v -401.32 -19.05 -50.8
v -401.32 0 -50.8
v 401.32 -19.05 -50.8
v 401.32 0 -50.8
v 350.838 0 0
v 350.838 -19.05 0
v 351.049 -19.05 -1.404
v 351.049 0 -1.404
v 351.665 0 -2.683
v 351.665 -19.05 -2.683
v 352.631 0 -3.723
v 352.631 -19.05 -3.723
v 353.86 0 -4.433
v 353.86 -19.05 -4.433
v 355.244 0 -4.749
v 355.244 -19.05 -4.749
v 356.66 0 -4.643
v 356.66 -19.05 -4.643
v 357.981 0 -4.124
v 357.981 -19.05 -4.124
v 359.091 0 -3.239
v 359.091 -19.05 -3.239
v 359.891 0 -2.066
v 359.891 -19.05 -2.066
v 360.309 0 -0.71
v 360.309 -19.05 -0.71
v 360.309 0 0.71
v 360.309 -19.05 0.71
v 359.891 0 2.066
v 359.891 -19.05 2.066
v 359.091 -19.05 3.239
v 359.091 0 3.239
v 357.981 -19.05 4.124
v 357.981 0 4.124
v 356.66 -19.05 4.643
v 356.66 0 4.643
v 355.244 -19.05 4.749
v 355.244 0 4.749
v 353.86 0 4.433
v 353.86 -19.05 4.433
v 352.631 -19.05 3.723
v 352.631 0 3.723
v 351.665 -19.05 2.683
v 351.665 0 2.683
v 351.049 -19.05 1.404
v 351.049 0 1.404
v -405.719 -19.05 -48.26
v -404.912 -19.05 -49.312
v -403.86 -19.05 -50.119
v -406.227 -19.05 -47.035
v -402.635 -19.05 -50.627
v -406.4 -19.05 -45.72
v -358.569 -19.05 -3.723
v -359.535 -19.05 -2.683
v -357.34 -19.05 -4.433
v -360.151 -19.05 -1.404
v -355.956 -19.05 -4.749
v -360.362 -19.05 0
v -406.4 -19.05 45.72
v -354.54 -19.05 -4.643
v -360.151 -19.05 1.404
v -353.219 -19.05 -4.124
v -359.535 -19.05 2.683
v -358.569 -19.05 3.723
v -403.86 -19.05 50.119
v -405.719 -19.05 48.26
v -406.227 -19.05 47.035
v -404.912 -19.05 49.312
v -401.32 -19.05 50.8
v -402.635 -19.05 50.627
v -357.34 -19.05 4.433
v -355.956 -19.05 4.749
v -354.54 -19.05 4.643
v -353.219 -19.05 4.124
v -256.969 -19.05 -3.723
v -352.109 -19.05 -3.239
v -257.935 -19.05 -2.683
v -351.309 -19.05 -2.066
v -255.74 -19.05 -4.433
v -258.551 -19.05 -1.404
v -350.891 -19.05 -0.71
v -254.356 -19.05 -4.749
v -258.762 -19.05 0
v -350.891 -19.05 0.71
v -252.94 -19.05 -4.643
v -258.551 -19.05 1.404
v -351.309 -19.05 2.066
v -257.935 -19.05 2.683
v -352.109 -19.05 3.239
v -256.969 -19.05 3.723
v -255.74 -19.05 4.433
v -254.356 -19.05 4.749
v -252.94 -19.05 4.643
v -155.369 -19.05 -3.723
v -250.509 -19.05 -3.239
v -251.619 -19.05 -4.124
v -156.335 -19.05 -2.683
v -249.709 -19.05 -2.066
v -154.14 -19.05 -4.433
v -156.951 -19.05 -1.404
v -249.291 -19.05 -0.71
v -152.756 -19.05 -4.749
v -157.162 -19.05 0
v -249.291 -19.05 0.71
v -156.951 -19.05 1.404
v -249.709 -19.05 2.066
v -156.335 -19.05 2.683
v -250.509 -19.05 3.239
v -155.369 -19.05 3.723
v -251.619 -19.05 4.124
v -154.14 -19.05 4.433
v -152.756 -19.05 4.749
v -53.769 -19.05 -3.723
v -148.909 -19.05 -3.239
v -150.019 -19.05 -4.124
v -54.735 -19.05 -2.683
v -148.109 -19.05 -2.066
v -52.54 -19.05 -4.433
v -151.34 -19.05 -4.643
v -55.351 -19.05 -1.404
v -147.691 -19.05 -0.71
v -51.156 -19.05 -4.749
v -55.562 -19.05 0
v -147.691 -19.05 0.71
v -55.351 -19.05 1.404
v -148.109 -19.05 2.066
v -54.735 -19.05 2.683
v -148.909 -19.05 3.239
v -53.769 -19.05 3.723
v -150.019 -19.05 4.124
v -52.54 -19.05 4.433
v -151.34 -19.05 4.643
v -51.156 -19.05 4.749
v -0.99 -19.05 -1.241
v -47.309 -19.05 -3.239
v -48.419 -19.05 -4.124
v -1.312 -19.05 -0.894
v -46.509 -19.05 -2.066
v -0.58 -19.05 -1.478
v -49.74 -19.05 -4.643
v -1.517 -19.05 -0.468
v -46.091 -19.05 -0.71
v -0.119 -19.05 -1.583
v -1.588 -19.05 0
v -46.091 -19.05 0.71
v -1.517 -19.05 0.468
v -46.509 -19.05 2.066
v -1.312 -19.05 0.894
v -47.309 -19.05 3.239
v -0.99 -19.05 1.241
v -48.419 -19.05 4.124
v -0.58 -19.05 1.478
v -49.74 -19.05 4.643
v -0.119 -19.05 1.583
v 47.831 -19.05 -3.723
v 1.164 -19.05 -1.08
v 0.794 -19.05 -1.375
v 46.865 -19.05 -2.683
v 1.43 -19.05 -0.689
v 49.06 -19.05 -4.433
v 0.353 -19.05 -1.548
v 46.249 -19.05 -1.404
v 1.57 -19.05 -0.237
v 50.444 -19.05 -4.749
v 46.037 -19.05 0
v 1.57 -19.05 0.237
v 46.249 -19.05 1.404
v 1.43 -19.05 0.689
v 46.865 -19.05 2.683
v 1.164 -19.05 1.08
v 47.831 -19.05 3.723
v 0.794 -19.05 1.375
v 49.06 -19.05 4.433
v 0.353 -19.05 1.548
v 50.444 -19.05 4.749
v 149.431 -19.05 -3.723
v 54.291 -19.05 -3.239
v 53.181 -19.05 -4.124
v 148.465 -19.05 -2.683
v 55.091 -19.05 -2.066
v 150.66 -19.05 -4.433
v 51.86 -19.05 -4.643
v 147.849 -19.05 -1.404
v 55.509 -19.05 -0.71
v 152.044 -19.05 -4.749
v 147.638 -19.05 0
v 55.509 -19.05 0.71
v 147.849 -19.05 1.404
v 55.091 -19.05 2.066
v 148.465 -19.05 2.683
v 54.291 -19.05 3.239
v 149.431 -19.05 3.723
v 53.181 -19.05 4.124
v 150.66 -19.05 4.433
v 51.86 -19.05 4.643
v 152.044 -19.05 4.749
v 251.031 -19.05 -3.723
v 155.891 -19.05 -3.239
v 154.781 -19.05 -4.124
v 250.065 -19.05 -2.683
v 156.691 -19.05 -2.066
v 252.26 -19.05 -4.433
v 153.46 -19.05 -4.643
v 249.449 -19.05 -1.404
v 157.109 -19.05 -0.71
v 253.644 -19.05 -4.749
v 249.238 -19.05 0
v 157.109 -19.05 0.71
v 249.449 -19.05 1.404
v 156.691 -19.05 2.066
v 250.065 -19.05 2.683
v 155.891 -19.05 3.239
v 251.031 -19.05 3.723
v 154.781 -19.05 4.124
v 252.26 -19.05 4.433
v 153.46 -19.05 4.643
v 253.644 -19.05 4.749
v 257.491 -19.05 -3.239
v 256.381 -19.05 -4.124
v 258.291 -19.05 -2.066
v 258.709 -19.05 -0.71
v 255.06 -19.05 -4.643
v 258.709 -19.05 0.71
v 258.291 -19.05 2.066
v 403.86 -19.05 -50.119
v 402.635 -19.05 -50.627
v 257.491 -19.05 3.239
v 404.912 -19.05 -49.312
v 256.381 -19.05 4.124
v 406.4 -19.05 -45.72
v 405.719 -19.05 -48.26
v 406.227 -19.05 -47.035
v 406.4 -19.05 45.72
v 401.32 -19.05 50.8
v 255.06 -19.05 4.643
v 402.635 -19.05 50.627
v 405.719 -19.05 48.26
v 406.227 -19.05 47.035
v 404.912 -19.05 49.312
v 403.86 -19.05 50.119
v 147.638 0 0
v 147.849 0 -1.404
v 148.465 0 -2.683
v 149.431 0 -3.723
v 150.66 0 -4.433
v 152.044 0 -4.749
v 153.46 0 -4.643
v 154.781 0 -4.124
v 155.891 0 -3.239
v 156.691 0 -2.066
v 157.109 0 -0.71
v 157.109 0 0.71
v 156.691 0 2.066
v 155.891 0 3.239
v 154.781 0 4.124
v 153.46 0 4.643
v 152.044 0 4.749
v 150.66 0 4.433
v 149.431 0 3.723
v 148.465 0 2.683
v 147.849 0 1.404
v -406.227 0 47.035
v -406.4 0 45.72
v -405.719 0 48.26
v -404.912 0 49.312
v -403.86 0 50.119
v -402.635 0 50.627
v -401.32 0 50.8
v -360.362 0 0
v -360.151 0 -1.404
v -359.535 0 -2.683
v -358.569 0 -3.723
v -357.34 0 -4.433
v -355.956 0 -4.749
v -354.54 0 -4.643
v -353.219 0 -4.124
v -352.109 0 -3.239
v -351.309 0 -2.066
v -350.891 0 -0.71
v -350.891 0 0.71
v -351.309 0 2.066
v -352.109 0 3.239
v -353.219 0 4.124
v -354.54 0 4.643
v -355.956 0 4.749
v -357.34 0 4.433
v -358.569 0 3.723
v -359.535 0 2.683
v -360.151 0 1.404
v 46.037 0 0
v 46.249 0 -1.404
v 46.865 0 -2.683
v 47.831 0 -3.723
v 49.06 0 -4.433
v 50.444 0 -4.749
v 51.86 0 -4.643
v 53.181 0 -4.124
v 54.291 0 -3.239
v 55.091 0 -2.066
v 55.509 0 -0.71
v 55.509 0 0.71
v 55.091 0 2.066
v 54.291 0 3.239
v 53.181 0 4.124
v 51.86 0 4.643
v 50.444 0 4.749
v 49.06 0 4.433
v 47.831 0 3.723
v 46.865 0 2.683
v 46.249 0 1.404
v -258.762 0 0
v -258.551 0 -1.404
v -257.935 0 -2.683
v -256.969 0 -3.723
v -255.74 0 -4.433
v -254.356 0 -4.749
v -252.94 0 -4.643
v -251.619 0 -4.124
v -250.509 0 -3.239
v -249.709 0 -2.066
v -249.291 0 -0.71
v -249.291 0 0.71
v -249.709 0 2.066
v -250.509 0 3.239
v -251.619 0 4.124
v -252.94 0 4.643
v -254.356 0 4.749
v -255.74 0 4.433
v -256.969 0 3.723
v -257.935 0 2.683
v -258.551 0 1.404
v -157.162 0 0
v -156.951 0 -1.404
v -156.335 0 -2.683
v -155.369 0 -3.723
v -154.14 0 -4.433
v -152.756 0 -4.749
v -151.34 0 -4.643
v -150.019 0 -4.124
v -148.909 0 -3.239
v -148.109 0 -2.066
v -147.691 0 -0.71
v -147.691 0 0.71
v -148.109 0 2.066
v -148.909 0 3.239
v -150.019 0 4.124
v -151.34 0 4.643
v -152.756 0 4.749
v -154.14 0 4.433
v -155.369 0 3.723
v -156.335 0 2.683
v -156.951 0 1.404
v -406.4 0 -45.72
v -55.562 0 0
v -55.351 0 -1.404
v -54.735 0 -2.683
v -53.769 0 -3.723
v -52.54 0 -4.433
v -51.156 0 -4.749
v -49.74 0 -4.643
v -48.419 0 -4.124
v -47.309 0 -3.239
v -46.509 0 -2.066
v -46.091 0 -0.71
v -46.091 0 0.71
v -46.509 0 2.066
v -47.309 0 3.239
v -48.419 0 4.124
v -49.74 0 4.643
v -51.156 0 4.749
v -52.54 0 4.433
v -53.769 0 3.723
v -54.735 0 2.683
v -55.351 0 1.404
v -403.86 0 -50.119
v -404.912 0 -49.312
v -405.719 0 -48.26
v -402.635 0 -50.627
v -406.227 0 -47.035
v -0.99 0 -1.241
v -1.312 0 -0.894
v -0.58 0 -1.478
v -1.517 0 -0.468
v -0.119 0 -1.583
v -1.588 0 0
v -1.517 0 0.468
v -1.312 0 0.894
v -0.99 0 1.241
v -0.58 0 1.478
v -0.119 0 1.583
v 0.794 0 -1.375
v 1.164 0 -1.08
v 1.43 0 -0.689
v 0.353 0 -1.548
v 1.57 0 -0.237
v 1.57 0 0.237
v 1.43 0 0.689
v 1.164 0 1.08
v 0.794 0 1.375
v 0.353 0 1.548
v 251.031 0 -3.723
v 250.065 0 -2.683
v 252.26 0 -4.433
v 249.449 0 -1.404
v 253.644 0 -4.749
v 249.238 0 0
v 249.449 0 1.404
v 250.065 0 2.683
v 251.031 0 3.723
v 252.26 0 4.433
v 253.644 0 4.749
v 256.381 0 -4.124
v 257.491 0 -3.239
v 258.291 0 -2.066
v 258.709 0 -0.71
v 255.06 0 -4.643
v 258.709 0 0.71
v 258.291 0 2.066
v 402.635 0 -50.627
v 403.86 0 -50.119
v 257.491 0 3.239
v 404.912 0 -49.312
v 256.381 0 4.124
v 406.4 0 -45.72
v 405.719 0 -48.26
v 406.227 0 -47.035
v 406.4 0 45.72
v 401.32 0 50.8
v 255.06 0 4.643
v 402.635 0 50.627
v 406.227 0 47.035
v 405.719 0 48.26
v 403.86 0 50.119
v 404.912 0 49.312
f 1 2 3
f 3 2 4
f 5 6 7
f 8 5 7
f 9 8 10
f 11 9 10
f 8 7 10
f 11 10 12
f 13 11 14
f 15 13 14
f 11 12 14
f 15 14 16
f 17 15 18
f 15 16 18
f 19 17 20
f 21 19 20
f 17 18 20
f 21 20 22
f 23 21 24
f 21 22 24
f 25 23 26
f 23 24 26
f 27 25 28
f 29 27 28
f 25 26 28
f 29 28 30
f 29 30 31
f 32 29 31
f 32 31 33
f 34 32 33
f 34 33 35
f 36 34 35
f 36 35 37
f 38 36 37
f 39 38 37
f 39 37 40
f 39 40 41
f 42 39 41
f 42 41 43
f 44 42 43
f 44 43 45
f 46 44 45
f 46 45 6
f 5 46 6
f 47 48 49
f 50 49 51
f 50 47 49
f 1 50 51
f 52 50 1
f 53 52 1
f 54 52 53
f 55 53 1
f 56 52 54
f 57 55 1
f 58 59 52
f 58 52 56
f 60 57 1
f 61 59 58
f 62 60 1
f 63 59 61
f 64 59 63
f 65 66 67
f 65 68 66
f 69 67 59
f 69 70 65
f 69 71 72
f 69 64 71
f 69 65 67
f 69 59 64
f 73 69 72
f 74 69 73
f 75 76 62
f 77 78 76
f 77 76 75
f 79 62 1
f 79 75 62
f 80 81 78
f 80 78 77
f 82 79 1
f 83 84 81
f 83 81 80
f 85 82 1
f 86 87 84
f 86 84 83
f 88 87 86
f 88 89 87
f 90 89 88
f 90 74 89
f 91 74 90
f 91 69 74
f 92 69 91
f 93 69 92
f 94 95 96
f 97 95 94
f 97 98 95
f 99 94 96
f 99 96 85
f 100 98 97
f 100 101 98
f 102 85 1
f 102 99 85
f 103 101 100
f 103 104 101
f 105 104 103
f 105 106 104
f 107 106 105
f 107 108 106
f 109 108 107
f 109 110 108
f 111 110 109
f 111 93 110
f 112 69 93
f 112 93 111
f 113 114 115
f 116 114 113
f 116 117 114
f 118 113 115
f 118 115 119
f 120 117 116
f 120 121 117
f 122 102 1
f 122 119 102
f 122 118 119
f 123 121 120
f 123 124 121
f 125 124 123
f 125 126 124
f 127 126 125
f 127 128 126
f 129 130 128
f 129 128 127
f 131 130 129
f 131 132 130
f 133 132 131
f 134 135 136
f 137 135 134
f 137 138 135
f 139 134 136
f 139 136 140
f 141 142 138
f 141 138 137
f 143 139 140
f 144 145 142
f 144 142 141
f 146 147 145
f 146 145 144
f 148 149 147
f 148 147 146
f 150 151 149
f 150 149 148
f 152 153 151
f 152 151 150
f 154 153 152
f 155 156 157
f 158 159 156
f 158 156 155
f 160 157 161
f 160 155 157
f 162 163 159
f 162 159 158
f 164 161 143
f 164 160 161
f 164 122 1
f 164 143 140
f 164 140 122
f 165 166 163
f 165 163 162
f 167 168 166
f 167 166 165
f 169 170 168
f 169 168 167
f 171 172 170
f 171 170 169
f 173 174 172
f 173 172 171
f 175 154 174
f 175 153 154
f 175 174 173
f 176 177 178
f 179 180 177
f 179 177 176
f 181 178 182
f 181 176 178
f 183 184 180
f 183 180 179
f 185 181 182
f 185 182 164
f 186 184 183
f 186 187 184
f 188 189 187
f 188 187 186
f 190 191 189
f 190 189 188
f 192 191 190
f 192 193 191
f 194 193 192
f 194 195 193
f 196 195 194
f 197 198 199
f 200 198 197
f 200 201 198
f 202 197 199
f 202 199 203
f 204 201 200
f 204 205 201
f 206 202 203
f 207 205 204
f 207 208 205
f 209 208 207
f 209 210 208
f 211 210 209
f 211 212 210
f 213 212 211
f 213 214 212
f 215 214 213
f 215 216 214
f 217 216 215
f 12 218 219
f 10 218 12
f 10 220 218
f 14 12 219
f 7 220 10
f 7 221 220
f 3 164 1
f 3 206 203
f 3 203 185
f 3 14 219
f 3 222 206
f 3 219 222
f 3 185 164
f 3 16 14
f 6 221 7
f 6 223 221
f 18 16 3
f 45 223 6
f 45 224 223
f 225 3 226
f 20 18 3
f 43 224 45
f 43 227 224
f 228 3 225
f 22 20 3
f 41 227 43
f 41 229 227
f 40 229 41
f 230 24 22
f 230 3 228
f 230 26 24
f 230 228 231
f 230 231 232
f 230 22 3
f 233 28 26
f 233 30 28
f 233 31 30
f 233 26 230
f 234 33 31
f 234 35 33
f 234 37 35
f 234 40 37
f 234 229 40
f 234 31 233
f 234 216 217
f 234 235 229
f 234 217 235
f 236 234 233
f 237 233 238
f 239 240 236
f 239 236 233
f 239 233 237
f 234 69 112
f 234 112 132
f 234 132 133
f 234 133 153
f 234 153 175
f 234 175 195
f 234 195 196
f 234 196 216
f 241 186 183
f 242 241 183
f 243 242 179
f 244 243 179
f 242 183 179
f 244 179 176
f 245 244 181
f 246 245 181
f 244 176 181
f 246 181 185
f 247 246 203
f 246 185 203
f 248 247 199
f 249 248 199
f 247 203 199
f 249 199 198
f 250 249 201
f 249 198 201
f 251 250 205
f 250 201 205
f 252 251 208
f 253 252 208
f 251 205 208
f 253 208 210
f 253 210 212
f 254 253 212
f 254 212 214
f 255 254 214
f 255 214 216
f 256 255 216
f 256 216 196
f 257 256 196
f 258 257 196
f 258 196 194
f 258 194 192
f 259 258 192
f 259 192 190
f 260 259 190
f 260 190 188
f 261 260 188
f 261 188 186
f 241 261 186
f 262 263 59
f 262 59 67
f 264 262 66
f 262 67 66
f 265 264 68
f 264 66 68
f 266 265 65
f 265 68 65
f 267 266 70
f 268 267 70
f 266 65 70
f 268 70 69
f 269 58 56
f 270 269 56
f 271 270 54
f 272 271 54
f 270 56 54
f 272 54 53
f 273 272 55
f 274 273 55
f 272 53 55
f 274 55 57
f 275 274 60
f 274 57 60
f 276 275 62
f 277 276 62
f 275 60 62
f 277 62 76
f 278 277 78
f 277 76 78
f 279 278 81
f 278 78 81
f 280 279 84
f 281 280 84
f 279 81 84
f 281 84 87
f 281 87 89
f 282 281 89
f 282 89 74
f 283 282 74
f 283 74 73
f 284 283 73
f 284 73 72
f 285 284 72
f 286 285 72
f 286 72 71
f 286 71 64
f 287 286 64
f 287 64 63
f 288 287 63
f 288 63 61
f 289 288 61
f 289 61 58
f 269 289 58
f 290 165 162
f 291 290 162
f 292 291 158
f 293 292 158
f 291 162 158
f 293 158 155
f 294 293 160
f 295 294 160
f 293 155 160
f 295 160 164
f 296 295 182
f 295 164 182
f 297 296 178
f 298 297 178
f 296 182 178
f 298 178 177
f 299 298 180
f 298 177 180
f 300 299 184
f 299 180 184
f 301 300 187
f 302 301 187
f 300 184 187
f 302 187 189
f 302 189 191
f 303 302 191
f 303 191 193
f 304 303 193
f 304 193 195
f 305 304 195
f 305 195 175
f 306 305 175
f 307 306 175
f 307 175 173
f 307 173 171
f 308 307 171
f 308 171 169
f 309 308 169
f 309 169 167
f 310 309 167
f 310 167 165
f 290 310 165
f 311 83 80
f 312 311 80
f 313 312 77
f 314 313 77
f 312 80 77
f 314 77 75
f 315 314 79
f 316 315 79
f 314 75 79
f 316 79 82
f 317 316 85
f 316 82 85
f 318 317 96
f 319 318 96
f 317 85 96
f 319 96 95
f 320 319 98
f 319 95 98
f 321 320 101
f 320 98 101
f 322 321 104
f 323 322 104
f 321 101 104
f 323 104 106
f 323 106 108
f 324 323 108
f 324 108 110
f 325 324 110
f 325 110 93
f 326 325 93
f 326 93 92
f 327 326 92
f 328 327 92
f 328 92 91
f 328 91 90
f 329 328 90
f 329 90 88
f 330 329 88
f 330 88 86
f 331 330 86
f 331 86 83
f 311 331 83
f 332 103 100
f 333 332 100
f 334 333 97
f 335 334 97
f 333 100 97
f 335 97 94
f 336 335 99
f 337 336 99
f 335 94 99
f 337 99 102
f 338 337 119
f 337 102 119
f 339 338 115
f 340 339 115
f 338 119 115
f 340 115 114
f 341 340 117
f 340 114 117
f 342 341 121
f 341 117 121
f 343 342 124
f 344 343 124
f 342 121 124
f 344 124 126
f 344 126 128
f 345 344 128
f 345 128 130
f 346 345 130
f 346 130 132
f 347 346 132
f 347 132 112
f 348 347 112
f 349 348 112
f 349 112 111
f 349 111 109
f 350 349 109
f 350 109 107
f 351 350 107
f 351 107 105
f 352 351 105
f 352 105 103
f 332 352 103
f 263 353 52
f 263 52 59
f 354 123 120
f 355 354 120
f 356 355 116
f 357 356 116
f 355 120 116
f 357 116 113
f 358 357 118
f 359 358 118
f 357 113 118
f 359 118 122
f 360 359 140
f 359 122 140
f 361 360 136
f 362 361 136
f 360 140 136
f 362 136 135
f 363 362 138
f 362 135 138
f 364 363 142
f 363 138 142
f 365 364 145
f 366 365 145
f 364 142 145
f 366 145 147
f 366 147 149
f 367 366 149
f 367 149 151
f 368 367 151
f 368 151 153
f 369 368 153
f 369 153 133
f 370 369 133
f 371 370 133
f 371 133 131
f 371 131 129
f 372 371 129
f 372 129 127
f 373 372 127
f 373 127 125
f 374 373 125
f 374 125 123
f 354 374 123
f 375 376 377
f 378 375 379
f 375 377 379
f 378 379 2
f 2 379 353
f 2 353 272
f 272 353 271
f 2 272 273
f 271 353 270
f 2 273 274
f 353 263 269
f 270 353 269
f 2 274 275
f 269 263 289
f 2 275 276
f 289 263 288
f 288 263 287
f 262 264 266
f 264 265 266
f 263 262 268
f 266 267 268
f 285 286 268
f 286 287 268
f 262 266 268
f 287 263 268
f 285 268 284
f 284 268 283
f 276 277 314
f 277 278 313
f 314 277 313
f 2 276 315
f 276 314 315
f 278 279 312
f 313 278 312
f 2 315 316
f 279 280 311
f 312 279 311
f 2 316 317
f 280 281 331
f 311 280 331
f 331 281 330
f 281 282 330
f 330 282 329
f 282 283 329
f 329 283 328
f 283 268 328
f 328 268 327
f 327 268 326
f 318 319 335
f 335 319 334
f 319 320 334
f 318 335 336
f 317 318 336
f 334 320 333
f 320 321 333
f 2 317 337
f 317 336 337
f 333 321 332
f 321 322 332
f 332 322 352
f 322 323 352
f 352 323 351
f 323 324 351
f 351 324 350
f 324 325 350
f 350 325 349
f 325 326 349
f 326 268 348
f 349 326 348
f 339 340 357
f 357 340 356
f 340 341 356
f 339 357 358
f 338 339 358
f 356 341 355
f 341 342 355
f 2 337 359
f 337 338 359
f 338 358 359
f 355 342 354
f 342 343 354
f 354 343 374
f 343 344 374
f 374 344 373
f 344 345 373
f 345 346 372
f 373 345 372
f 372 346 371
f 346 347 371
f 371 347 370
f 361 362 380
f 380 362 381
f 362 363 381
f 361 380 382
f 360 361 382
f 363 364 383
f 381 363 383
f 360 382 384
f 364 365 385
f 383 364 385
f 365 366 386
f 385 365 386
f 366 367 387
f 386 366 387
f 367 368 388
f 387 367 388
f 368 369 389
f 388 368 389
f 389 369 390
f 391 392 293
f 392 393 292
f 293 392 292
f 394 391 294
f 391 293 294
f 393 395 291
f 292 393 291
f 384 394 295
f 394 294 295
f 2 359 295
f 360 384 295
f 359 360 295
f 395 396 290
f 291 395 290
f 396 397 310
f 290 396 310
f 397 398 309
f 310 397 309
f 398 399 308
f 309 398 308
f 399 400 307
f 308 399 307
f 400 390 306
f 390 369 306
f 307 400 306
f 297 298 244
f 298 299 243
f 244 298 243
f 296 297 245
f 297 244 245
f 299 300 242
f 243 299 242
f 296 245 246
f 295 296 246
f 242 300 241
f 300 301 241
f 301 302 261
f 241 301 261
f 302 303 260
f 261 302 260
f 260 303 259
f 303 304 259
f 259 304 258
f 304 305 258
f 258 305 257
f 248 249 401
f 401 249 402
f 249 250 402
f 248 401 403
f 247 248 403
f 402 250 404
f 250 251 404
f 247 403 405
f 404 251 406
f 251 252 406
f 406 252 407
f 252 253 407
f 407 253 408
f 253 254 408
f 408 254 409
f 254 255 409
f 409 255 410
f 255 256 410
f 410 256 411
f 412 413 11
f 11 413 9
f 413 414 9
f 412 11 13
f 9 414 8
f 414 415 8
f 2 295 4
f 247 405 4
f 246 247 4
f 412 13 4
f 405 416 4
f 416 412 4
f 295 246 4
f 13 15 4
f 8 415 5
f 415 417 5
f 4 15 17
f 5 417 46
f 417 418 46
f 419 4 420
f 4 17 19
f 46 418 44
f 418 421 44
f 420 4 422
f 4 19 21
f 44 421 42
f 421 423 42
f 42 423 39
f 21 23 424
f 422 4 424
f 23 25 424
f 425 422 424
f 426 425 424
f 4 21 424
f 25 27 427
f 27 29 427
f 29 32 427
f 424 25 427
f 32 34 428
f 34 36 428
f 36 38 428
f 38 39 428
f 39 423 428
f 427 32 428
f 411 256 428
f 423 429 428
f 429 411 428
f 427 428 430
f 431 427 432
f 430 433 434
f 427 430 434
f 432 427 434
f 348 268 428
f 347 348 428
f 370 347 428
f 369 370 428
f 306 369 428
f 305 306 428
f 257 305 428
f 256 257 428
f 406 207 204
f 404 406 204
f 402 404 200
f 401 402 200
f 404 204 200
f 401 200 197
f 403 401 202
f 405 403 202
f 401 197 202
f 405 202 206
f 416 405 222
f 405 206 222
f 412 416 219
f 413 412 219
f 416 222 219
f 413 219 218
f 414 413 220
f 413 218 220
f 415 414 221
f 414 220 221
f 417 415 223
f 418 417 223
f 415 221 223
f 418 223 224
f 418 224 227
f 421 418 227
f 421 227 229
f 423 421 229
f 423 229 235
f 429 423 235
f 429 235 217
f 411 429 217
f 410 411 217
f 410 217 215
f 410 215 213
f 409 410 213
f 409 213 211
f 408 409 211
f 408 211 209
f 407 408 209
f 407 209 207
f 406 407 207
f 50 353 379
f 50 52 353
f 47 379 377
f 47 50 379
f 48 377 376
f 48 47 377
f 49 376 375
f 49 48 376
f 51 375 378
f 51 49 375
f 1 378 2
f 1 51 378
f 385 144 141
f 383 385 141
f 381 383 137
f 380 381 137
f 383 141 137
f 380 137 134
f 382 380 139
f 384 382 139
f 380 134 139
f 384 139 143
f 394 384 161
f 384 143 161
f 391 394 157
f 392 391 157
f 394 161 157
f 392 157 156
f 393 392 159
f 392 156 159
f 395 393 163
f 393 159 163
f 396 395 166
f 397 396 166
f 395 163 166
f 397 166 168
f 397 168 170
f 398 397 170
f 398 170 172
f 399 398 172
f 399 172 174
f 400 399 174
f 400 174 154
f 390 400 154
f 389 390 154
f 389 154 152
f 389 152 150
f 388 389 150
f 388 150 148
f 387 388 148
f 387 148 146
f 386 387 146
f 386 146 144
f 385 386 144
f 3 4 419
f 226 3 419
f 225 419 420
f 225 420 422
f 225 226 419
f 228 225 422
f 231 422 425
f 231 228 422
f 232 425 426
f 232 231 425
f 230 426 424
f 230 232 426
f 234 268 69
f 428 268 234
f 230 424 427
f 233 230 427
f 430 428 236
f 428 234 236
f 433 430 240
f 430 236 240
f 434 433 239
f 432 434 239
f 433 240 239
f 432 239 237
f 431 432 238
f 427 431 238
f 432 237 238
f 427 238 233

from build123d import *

# Parameters (mm, degrees)
F0_W     = 812.8
F0_H     = 101.6
F1_DEPTH = 19.05
F2_D     = 9.525
F3_D     = 3.175
F4_R     = 5.08


with BuildPart() as f1:
    # F0 (on Front) → F1 (new body)
    with BuildSketch(Plane.XZ):
        Rectangle(F0_W, F0_H)
    extrude(amount=F1_DEPTH)

    # F2 (through all)
    with Locations(Plane(origin=(0, 0, 0), x_dir=(1, 0, 0), z_dir=(0, 1, 0))):
        with Locations((-355.6, 0), (-254, 0), (-152.4, 0), (-50.8, 0), (50.8, 0), (152.4, 0), (254, 0), (355.6, 0)):
            Hole(F2_D / 2)

    # F3 (through all)
    with Locations(Plane(origin=(0, 0, 0), x_dir=(1, 0, 0), z_dir=(0, 1, 0))):
        with Locations((0, 0)):
            Hole(F3_D / 2)

    # F4
    f4_edges = [f1.edges().sort_by_distance(p)[0] for p in [
        (-406.4, -9.525, 50.8),
        (-406.4, -9.525, -50.8),
        (406.4, -9.525, 50.8),
        (406.4, -9.525, -50.8),
    ]]
    fillet(f4_edges, radius=F4_R)


solid = f1.part
